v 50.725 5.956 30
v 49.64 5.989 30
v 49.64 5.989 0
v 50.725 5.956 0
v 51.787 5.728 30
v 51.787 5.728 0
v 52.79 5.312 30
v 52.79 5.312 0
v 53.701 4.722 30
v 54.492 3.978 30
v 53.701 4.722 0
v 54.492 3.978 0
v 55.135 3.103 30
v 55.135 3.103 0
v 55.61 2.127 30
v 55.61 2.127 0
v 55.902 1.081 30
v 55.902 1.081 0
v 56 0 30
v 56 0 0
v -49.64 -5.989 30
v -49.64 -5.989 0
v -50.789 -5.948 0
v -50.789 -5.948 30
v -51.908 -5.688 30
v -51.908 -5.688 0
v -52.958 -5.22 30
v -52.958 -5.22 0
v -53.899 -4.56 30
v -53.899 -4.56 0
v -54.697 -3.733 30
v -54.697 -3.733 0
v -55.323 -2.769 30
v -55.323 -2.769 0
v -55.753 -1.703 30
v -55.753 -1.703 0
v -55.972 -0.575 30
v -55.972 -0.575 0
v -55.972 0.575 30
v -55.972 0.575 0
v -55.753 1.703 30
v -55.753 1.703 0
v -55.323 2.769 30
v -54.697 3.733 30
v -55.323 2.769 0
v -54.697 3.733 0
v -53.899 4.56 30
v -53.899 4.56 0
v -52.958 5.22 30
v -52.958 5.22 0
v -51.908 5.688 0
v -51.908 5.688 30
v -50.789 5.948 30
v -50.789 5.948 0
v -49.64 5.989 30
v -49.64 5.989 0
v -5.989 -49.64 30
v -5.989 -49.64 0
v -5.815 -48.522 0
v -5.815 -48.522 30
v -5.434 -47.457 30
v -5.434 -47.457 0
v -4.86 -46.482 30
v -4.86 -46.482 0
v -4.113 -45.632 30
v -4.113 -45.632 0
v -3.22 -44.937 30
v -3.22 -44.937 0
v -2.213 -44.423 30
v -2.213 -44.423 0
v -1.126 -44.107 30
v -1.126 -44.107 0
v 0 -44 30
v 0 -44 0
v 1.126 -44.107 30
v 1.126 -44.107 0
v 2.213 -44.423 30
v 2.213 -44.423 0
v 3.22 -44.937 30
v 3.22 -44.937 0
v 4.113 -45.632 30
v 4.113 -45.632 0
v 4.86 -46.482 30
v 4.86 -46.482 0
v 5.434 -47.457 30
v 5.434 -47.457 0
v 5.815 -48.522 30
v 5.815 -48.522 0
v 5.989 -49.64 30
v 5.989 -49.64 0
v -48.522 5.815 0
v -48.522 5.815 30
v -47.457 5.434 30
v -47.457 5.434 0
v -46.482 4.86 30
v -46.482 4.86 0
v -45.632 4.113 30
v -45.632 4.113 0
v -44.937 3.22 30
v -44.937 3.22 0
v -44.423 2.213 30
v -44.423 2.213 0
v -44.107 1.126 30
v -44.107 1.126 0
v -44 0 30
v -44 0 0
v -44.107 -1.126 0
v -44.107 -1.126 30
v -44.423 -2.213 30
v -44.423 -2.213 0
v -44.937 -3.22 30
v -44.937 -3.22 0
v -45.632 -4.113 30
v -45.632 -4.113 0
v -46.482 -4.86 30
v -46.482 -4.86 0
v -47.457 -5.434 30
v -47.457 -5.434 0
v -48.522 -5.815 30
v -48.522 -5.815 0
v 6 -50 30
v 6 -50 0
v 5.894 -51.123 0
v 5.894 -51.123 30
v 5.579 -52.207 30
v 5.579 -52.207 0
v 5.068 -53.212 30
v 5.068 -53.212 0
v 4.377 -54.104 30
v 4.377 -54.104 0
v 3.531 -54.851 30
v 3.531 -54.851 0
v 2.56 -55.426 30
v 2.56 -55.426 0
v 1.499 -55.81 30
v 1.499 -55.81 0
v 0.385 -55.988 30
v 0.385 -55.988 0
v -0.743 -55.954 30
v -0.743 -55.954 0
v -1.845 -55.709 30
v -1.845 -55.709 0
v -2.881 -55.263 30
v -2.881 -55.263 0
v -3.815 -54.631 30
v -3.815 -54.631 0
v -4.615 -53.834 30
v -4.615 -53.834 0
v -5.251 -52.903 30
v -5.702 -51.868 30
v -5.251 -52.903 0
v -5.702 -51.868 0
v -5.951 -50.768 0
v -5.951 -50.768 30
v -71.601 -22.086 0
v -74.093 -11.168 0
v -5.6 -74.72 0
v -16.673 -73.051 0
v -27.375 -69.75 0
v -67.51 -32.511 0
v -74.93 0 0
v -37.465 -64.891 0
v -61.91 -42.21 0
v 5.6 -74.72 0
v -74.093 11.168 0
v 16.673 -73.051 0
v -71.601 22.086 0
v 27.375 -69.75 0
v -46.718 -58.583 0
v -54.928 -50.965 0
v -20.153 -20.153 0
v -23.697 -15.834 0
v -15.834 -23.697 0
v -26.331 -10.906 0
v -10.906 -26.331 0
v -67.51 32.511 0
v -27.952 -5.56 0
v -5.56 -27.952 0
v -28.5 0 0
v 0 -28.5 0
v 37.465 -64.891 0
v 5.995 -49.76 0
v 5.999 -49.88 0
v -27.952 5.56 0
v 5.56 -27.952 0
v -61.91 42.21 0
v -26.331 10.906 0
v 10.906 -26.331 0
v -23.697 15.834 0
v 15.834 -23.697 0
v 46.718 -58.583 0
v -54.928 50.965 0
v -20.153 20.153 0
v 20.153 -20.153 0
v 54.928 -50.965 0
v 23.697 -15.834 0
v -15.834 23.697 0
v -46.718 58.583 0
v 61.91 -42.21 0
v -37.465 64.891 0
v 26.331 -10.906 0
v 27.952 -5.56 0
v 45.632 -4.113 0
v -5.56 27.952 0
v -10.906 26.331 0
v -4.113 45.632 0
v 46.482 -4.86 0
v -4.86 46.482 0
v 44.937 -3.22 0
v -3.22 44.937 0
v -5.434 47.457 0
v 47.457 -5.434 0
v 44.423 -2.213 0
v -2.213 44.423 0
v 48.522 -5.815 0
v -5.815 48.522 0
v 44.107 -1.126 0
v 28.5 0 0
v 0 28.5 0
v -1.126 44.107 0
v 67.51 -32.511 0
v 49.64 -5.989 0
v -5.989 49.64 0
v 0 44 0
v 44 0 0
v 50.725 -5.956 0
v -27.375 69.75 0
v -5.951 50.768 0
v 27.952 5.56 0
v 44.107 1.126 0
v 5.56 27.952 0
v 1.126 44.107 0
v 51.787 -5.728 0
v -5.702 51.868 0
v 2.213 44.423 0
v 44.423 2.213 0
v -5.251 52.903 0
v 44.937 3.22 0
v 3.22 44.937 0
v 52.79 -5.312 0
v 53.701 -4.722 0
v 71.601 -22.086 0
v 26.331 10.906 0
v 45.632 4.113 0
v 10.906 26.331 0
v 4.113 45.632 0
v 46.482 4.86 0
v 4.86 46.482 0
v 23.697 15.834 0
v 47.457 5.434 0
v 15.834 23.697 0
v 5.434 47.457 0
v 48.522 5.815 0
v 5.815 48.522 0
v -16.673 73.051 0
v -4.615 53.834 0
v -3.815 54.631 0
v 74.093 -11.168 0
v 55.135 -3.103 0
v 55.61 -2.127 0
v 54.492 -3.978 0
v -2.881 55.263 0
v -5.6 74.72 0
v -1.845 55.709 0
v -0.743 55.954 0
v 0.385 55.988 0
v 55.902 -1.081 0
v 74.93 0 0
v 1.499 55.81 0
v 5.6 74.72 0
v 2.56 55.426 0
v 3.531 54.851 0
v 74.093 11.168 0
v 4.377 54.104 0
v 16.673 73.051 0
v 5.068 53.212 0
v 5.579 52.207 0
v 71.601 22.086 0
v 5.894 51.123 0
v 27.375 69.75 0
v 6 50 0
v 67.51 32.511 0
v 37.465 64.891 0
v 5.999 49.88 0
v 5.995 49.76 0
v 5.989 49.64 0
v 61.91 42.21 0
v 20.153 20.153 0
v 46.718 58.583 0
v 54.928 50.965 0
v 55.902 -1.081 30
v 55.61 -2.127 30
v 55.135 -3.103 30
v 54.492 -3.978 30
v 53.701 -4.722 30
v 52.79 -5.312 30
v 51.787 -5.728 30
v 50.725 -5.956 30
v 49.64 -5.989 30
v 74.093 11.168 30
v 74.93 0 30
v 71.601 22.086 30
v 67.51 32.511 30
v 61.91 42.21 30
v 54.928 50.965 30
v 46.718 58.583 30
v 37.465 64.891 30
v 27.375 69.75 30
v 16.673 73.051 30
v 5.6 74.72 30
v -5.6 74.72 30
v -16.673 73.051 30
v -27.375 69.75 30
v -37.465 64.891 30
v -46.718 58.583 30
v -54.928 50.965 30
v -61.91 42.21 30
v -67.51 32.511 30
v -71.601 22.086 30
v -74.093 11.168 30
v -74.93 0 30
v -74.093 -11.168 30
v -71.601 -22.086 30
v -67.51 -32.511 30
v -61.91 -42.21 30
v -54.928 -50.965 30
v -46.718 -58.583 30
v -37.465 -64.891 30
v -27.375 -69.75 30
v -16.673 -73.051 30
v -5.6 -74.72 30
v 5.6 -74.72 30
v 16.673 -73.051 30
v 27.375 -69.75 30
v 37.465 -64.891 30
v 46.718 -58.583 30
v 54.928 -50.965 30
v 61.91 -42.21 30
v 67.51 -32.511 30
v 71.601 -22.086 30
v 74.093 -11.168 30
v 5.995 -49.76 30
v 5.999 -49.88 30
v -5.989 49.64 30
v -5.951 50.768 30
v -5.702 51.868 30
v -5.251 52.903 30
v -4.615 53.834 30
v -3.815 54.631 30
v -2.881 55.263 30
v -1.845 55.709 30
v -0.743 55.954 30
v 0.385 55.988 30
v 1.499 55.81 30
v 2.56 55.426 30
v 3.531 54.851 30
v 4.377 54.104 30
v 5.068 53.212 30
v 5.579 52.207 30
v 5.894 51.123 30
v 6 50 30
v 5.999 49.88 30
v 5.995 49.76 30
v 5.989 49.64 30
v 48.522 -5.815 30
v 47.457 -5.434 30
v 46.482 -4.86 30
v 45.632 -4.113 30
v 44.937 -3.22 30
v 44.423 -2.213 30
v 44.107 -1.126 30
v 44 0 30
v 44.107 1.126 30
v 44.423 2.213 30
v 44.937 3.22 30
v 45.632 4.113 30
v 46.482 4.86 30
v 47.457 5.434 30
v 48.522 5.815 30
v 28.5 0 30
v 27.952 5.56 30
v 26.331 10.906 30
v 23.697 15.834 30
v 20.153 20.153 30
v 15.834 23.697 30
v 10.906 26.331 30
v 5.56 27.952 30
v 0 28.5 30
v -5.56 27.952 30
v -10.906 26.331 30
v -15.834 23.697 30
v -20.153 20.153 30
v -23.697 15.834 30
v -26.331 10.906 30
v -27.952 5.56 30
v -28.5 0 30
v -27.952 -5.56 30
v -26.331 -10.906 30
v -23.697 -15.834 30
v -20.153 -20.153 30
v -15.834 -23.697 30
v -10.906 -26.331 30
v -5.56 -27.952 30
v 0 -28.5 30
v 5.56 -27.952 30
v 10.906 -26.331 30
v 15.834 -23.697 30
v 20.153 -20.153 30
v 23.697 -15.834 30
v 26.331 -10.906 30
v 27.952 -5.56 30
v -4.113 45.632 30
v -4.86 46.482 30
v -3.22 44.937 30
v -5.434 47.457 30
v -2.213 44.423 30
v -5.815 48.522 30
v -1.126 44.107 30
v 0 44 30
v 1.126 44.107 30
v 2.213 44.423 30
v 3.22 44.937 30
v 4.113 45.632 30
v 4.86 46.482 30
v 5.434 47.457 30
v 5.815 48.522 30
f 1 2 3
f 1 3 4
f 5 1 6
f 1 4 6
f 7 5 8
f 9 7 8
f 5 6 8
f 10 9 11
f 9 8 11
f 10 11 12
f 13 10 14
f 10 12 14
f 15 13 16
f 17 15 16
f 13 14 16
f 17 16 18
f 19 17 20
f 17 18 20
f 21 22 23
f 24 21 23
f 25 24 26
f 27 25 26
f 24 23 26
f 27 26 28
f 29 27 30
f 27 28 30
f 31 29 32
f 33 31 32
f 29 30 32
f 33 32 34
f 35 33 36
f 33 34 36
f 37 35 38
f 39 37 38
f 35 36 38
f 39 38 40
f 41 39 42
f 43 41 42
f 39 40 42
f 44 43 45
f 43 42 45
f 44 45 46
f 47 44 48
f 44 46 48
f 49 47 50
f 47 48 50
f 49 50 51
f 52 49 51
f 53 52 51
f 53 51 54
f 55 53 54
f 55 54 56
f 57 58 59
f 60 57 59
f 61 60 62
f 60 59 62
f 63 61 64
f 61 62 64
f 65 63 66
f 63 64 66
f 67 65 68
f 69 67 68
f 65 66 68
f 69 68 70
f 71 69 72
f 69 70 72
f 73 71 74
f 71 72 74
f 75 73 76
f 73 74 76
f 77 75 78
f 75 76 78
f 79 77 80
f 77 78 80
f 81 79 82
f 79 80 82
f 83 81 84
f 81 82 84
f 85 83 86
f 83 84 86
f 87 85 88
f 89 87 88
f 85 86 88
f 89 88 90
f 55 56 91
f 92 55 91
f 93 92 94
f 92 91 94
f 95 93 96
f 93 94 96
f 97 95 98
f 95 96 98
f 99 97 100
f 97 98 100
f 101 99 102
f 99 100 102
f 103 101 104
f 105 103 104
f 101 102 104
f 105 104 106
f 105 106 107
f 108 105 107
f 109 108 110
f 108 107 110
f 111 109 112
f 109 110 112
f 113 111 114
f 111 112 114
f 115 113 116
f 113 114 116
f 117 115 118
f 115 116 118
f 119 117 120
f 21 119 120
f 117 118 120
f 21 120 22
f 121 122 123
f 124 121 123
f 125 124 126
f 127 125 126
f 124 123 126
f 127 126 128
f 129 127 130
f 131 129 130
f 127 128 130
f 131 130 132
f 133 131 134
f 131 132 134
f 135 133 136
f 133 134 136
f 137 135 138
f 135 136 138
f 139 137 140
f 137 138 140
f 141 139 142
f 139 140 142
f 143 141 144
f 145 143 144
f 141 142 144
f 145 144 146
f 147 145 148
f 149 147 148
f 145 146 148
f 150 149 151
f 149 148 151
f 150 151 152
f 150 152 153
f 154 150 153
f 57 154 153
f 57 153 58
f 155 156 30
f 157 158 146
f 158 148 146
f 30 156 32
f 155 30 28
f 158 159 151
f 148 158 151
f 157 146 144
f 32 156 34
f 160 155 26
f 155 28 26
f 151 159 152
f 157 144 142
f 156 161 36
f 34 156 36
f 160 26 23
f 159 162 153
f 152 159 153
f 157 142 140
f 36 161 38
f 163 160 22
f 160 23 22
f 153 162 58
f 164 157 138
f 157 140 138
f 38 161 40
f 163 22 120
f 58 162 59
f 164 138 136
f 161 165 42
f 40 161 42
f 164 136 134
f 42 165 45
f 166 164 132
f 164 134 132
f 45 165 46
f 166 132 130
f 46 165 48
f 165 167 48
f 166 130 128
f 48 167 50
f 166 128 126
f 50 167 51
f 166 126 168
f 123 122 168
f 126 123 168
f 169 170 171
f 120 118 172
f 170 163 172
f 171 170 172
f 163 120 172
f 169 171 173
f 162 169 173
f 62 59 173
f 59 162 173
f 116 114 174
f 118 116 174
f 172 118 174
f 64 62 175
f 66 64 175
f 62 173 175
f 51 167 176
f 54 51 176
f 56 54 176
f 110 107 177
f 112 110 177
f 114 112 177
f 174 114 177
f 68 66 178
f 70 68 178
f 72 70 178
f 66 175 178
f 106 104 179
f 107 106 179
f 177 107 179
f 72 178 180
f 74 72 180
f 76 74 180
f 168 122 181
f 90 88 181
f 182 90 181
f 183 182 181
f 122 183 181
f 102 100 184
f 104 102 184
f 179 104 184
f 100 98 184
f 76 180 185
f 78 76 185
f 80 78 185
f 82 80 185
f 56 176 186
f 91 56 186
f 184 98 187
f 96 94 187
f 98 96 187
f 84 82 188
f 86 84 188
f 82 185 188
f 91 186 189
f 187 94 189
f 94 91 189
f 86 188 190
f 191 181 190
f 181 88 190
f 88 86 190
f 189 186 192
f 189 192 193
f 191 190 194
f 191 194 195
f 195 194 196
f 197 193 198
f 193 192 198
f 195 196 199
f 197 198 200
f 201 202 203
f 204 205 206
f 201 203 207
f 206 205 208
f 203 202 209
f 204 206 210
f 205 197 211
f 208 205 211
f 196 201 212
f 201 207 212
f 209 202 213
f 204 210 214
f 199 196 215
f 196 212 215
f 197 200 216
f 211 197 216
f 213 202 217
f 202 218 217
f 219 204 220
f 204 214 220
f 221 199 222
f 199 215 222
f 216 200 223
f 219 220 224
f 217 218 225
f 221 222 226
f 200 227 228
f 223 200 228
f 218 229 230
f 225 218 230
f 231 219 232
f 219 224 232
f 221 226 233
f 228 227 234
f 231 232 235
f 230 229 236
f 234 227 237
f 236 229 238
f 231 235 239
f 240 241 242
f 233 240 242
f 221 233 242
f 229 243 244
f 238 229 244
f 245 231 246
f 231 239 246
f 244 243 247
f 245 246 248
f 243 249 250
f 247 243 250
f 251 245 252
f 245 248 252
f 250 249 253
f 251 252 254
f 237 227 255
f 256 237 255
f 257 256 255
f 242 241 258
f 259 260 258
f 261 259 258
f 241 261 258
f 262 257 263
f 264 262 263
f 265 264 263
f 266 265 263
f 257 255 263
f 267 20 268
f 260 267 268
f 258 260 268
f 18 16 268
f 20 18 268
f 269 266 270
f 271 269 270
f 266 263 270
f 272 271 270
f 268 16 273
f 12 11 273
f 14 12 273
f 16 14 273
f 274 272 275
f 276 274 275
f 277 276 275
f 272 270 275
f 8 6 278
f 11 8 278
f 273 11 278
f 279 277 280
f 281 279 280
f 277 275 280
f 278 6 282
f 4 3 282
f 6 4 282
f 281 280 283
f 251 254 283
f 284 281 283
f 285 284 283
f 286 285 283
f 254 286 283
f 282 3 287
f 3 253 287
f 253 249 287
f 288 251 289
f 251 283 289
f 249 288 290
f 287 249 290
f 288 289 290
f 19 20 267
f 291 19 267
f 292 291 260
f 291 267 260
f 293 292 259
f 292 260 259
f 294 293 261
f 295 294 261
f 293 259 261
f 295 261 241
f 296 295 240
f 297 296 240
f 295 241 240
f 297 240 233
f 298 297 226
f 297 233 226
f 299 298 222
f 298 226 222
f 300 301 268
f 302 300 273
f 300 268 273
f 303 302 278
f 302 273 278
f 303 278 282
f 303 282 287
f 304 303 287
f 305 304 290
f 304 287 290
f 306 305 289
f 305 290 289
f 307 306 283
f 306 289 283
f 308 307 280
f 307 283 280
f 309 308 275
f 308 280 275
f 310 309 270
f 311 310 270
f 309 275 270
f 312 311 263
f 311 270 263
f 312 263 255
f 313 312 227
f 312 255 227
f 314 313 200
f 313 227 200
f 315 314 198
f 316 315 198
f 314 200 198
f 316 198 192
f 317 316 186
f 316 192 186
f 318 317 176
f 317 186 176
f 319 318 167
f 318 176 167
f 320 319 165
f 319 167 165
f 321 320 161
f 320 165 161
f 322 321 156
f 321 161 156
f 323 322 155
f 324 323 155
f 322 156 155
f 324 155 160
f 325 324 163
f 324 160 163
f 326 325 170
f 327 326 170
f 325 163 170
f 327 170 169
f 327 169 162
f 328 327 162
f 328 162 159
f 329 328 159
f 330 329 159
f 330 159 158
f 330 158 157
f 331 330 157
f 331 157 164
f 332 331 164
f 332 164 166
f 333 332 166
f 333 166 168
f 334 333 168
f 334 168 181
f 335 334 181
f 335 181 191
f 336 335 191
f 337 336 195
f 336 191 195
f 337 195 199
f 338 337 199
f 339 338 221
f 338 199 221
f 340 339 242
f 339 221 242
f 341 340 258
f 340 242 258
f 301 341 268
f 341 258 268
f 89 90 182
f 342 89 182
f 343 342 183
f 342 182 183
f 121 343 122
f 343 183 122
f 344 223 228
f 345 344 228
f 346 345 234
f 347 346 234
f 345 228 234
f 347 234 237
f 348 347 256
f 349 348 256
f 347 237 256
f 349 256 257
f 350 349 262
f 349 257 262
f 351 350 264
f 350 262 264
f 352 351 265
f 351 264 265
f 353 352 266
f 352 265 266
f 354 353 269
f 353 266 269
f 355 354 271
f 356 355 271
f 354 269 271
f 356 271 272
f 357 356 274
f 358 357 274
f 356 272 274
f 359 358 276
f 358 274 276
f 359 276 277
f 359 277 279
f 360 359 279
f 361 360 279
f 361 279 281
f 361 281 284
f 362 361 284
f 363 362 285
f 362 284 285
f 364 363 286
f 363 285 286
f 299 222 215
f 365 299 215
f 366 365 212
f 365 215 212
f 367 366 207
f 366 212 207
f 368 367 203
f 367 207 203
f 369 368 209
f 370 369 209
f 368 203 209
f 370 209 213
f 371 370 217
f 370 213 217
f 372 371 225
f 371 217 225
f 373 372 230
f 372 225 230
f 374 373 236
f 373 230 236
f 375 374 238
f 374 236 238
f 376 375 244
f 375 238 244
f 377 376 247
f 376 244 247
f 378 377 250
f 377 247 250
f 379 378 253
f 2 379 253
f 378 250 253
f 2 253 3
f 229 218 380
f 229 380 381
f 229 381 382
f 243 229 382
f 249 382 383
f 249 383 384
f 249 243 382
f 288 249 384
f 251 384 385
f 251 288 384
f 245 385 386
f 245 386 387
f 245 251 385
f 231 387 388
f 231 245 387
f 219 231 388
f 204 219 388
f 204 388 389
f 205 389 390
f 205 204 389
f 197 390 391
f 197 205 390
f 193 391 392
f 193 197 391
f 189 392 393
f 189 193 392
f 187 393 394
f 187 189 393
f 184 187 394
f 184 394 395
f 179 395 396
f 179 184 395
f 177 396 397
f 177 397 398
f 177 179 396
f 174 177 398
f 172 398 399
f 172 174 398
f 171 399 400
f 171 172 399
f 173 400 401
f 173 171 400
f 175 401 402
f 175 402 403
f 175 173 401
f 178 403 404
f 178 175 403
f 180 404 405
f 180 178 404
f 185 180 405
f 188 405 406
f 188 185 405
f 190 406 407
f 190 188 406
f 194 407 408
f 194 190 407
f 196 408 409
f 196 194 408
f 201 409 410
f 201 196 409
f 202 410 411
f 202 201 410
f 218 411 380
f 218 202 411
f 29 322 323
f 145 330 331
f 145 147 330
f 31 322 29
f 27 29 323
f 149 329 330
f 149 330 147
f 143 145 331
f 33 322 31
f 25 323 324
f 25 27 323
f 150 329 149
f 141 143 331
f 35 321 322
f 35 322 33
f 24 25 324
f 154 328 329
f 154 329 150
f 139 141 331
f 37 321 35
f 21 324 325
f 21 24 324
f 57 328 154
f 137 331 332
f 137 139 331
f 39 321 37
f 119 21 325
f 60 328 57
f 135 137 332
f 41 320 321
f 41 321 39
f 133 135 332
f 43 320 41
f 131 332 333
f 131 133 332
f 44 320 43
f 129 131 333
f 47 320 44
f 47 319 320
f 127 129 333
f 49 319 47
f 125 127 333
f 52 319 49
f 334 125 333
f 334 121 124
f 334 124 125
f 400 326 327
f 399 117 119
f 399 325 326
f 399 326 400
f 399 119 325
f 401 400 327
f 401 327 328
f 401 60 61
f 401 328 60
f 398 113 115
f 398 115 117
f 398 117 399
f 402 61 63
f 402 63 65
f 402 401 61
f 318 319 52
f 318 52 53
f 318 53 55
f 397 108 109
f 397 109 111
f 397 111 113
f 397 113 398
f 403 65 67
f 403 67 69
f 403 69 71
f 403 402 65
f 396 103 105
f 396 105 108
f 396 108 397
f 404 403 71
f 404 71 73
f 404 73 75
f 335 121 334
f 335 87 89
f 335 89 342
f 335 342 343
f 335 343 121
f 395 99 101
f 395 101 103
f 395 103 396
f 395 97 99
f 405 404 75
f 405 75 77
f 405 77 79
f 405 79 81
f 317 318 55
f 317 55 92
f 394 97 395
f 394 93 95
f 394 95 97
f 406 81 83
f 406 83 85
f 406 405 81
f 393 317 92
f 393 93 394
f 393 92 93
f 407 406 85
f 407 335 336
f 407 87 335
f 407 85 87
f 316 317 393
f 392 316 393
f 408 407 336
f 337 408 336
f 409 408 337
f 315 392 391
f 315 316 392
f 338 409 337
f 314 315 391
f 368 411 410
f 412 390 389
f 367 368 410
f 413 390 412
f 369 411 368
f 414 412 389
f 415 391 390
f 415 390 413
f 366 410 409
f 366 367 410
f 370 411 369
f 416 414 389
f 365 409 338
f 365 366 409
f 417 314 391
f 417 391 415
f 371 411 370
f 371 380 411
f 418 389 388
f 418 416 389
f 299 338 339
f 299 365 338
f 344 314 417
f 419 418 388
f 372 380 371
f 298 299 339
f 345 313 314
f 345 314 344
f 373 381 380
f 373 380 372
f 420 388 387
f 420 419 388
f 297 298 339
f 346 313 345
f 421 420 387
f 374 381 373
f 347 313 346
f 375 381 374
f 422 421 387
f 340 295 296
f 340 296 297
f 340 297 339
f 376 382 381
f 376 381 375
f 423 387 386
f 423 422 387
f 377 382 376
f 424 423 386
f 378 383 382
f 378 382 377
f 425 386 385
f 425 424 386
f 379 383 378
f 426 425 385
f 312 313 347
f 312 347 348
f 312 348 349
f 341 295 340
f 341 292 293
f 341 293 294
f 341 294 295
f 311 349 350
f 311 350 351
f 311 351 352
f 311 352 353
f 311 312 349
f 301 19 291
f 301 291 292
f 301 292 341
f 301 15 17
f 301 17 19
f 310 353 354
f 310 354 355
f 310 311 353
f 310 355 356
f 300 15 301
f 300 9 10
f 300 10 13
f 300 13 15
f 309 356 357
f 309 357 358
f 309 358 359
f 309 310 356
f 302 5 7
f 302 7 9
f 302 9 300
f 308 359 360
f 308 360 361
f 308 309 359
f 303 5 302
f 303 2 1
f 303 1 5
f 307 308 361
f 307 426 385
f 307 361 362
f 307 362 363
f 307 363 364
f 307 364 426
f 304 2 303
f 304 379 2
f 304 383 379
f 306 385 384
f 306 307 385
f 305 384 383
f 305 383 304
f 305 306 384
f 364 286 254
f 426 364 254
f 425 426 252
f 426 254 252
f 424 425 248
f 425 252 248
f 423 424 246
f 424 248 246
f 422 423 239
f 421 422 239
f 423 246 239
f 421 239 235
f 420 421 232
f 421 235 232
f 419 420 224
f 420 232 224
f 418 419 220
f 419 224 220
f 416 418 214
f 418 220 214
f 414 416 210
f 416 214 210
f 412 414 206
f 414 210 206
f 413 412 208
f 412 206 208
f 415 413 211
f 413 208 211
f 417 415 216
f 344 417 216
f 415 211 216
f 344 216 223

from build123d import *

# Parameters (mm, degrees)
F0_R     = 74.93
F0_R_2   = 28.5
F1_DEPTH = 30


with BuildPart() as f1:
    # F0 (on Top) → F1 (new body)
    with BuildSketch(Plane.XY):
        Circle(F0_R)
        with BuildLine():
            ThreePointArc((5.98919, 49.64), (35.355339, 35.355339), (49.64, 5.98919))
            ThreePointArc((49.64, 5.98919), (54.113393, 4.368066), (56, 0))
            ThreePointArc((56, 0), (54.113393, -4.368066), (49.64, -5.98919))
            ThreePointArc((49.64, -5.98919), (35.355339, -35.355339), (5.98919, -49.64))
            ThreePointArc((5.98919, -49.64), (5.997297, -49.819919), (6, -50))
            ThreePointArc((6, -50), (-0.180081, -55.997297), (-5.98919, -49.64))
            ThreePointArc((-5.98919, -49.64), (-35.355339, -35.355339), (-49.64, -5.98919))
            ThreePointArc((-49.64, -5.98919), (-56, 0), (-49.64, 5.98919))
            ThreePointArc((-49.64, 5.98919), (-35.355339, 35.355339), (-5.98919, 49.64))
            ThreePointArc((-5.98919, 49.64), (-0.180081, 55.997297), (6, 50))
            ThreePointArc((6, 50), (5.997297, 49.819919), (5.98919, 49.64))
        make_face(mode=Mode.SUBTRACT)
        with BuildLine():
            ThreePointArc((49.64, -5.98919), (44, 0), (49.64, 5.98919))
            ThreePointArc((49.64, 5.98919), (35.355339, 35.355339), (5.98919, 49.64))
            ThreePointArc((5.98919, 49.64), (0, 44), (-5.98919, 49.64))
            ThreePointArc((-5.98919, 49.64), (-35.355339, 35.355339), (-49.64, 5.98919))
            ThreePointArc((-49.64, 5.98919), (-45.631934, 4.113393), (-44, 0))
            ThreePointArc((-44, 0), (-45.631934, -4.113393), (-49.64, -5.98919))
            ThreePointArc((-49.64, -5.98919), (-35.355339, -35.355339), (-5.98919, -49.64))
            ThreePointArc((-5.98919, -49.64), (0, -44), (5.98919, -49.64))
            ThreePointArc((5.98919, -49.64), (35.355339, -35.355339), (49.64, -5.98919))
        make_face()
        Circle(F0_R_2, mode=Mode.SUBTRACT)
    extrude(amount=F1_DEPTH)


solid = f1.part
